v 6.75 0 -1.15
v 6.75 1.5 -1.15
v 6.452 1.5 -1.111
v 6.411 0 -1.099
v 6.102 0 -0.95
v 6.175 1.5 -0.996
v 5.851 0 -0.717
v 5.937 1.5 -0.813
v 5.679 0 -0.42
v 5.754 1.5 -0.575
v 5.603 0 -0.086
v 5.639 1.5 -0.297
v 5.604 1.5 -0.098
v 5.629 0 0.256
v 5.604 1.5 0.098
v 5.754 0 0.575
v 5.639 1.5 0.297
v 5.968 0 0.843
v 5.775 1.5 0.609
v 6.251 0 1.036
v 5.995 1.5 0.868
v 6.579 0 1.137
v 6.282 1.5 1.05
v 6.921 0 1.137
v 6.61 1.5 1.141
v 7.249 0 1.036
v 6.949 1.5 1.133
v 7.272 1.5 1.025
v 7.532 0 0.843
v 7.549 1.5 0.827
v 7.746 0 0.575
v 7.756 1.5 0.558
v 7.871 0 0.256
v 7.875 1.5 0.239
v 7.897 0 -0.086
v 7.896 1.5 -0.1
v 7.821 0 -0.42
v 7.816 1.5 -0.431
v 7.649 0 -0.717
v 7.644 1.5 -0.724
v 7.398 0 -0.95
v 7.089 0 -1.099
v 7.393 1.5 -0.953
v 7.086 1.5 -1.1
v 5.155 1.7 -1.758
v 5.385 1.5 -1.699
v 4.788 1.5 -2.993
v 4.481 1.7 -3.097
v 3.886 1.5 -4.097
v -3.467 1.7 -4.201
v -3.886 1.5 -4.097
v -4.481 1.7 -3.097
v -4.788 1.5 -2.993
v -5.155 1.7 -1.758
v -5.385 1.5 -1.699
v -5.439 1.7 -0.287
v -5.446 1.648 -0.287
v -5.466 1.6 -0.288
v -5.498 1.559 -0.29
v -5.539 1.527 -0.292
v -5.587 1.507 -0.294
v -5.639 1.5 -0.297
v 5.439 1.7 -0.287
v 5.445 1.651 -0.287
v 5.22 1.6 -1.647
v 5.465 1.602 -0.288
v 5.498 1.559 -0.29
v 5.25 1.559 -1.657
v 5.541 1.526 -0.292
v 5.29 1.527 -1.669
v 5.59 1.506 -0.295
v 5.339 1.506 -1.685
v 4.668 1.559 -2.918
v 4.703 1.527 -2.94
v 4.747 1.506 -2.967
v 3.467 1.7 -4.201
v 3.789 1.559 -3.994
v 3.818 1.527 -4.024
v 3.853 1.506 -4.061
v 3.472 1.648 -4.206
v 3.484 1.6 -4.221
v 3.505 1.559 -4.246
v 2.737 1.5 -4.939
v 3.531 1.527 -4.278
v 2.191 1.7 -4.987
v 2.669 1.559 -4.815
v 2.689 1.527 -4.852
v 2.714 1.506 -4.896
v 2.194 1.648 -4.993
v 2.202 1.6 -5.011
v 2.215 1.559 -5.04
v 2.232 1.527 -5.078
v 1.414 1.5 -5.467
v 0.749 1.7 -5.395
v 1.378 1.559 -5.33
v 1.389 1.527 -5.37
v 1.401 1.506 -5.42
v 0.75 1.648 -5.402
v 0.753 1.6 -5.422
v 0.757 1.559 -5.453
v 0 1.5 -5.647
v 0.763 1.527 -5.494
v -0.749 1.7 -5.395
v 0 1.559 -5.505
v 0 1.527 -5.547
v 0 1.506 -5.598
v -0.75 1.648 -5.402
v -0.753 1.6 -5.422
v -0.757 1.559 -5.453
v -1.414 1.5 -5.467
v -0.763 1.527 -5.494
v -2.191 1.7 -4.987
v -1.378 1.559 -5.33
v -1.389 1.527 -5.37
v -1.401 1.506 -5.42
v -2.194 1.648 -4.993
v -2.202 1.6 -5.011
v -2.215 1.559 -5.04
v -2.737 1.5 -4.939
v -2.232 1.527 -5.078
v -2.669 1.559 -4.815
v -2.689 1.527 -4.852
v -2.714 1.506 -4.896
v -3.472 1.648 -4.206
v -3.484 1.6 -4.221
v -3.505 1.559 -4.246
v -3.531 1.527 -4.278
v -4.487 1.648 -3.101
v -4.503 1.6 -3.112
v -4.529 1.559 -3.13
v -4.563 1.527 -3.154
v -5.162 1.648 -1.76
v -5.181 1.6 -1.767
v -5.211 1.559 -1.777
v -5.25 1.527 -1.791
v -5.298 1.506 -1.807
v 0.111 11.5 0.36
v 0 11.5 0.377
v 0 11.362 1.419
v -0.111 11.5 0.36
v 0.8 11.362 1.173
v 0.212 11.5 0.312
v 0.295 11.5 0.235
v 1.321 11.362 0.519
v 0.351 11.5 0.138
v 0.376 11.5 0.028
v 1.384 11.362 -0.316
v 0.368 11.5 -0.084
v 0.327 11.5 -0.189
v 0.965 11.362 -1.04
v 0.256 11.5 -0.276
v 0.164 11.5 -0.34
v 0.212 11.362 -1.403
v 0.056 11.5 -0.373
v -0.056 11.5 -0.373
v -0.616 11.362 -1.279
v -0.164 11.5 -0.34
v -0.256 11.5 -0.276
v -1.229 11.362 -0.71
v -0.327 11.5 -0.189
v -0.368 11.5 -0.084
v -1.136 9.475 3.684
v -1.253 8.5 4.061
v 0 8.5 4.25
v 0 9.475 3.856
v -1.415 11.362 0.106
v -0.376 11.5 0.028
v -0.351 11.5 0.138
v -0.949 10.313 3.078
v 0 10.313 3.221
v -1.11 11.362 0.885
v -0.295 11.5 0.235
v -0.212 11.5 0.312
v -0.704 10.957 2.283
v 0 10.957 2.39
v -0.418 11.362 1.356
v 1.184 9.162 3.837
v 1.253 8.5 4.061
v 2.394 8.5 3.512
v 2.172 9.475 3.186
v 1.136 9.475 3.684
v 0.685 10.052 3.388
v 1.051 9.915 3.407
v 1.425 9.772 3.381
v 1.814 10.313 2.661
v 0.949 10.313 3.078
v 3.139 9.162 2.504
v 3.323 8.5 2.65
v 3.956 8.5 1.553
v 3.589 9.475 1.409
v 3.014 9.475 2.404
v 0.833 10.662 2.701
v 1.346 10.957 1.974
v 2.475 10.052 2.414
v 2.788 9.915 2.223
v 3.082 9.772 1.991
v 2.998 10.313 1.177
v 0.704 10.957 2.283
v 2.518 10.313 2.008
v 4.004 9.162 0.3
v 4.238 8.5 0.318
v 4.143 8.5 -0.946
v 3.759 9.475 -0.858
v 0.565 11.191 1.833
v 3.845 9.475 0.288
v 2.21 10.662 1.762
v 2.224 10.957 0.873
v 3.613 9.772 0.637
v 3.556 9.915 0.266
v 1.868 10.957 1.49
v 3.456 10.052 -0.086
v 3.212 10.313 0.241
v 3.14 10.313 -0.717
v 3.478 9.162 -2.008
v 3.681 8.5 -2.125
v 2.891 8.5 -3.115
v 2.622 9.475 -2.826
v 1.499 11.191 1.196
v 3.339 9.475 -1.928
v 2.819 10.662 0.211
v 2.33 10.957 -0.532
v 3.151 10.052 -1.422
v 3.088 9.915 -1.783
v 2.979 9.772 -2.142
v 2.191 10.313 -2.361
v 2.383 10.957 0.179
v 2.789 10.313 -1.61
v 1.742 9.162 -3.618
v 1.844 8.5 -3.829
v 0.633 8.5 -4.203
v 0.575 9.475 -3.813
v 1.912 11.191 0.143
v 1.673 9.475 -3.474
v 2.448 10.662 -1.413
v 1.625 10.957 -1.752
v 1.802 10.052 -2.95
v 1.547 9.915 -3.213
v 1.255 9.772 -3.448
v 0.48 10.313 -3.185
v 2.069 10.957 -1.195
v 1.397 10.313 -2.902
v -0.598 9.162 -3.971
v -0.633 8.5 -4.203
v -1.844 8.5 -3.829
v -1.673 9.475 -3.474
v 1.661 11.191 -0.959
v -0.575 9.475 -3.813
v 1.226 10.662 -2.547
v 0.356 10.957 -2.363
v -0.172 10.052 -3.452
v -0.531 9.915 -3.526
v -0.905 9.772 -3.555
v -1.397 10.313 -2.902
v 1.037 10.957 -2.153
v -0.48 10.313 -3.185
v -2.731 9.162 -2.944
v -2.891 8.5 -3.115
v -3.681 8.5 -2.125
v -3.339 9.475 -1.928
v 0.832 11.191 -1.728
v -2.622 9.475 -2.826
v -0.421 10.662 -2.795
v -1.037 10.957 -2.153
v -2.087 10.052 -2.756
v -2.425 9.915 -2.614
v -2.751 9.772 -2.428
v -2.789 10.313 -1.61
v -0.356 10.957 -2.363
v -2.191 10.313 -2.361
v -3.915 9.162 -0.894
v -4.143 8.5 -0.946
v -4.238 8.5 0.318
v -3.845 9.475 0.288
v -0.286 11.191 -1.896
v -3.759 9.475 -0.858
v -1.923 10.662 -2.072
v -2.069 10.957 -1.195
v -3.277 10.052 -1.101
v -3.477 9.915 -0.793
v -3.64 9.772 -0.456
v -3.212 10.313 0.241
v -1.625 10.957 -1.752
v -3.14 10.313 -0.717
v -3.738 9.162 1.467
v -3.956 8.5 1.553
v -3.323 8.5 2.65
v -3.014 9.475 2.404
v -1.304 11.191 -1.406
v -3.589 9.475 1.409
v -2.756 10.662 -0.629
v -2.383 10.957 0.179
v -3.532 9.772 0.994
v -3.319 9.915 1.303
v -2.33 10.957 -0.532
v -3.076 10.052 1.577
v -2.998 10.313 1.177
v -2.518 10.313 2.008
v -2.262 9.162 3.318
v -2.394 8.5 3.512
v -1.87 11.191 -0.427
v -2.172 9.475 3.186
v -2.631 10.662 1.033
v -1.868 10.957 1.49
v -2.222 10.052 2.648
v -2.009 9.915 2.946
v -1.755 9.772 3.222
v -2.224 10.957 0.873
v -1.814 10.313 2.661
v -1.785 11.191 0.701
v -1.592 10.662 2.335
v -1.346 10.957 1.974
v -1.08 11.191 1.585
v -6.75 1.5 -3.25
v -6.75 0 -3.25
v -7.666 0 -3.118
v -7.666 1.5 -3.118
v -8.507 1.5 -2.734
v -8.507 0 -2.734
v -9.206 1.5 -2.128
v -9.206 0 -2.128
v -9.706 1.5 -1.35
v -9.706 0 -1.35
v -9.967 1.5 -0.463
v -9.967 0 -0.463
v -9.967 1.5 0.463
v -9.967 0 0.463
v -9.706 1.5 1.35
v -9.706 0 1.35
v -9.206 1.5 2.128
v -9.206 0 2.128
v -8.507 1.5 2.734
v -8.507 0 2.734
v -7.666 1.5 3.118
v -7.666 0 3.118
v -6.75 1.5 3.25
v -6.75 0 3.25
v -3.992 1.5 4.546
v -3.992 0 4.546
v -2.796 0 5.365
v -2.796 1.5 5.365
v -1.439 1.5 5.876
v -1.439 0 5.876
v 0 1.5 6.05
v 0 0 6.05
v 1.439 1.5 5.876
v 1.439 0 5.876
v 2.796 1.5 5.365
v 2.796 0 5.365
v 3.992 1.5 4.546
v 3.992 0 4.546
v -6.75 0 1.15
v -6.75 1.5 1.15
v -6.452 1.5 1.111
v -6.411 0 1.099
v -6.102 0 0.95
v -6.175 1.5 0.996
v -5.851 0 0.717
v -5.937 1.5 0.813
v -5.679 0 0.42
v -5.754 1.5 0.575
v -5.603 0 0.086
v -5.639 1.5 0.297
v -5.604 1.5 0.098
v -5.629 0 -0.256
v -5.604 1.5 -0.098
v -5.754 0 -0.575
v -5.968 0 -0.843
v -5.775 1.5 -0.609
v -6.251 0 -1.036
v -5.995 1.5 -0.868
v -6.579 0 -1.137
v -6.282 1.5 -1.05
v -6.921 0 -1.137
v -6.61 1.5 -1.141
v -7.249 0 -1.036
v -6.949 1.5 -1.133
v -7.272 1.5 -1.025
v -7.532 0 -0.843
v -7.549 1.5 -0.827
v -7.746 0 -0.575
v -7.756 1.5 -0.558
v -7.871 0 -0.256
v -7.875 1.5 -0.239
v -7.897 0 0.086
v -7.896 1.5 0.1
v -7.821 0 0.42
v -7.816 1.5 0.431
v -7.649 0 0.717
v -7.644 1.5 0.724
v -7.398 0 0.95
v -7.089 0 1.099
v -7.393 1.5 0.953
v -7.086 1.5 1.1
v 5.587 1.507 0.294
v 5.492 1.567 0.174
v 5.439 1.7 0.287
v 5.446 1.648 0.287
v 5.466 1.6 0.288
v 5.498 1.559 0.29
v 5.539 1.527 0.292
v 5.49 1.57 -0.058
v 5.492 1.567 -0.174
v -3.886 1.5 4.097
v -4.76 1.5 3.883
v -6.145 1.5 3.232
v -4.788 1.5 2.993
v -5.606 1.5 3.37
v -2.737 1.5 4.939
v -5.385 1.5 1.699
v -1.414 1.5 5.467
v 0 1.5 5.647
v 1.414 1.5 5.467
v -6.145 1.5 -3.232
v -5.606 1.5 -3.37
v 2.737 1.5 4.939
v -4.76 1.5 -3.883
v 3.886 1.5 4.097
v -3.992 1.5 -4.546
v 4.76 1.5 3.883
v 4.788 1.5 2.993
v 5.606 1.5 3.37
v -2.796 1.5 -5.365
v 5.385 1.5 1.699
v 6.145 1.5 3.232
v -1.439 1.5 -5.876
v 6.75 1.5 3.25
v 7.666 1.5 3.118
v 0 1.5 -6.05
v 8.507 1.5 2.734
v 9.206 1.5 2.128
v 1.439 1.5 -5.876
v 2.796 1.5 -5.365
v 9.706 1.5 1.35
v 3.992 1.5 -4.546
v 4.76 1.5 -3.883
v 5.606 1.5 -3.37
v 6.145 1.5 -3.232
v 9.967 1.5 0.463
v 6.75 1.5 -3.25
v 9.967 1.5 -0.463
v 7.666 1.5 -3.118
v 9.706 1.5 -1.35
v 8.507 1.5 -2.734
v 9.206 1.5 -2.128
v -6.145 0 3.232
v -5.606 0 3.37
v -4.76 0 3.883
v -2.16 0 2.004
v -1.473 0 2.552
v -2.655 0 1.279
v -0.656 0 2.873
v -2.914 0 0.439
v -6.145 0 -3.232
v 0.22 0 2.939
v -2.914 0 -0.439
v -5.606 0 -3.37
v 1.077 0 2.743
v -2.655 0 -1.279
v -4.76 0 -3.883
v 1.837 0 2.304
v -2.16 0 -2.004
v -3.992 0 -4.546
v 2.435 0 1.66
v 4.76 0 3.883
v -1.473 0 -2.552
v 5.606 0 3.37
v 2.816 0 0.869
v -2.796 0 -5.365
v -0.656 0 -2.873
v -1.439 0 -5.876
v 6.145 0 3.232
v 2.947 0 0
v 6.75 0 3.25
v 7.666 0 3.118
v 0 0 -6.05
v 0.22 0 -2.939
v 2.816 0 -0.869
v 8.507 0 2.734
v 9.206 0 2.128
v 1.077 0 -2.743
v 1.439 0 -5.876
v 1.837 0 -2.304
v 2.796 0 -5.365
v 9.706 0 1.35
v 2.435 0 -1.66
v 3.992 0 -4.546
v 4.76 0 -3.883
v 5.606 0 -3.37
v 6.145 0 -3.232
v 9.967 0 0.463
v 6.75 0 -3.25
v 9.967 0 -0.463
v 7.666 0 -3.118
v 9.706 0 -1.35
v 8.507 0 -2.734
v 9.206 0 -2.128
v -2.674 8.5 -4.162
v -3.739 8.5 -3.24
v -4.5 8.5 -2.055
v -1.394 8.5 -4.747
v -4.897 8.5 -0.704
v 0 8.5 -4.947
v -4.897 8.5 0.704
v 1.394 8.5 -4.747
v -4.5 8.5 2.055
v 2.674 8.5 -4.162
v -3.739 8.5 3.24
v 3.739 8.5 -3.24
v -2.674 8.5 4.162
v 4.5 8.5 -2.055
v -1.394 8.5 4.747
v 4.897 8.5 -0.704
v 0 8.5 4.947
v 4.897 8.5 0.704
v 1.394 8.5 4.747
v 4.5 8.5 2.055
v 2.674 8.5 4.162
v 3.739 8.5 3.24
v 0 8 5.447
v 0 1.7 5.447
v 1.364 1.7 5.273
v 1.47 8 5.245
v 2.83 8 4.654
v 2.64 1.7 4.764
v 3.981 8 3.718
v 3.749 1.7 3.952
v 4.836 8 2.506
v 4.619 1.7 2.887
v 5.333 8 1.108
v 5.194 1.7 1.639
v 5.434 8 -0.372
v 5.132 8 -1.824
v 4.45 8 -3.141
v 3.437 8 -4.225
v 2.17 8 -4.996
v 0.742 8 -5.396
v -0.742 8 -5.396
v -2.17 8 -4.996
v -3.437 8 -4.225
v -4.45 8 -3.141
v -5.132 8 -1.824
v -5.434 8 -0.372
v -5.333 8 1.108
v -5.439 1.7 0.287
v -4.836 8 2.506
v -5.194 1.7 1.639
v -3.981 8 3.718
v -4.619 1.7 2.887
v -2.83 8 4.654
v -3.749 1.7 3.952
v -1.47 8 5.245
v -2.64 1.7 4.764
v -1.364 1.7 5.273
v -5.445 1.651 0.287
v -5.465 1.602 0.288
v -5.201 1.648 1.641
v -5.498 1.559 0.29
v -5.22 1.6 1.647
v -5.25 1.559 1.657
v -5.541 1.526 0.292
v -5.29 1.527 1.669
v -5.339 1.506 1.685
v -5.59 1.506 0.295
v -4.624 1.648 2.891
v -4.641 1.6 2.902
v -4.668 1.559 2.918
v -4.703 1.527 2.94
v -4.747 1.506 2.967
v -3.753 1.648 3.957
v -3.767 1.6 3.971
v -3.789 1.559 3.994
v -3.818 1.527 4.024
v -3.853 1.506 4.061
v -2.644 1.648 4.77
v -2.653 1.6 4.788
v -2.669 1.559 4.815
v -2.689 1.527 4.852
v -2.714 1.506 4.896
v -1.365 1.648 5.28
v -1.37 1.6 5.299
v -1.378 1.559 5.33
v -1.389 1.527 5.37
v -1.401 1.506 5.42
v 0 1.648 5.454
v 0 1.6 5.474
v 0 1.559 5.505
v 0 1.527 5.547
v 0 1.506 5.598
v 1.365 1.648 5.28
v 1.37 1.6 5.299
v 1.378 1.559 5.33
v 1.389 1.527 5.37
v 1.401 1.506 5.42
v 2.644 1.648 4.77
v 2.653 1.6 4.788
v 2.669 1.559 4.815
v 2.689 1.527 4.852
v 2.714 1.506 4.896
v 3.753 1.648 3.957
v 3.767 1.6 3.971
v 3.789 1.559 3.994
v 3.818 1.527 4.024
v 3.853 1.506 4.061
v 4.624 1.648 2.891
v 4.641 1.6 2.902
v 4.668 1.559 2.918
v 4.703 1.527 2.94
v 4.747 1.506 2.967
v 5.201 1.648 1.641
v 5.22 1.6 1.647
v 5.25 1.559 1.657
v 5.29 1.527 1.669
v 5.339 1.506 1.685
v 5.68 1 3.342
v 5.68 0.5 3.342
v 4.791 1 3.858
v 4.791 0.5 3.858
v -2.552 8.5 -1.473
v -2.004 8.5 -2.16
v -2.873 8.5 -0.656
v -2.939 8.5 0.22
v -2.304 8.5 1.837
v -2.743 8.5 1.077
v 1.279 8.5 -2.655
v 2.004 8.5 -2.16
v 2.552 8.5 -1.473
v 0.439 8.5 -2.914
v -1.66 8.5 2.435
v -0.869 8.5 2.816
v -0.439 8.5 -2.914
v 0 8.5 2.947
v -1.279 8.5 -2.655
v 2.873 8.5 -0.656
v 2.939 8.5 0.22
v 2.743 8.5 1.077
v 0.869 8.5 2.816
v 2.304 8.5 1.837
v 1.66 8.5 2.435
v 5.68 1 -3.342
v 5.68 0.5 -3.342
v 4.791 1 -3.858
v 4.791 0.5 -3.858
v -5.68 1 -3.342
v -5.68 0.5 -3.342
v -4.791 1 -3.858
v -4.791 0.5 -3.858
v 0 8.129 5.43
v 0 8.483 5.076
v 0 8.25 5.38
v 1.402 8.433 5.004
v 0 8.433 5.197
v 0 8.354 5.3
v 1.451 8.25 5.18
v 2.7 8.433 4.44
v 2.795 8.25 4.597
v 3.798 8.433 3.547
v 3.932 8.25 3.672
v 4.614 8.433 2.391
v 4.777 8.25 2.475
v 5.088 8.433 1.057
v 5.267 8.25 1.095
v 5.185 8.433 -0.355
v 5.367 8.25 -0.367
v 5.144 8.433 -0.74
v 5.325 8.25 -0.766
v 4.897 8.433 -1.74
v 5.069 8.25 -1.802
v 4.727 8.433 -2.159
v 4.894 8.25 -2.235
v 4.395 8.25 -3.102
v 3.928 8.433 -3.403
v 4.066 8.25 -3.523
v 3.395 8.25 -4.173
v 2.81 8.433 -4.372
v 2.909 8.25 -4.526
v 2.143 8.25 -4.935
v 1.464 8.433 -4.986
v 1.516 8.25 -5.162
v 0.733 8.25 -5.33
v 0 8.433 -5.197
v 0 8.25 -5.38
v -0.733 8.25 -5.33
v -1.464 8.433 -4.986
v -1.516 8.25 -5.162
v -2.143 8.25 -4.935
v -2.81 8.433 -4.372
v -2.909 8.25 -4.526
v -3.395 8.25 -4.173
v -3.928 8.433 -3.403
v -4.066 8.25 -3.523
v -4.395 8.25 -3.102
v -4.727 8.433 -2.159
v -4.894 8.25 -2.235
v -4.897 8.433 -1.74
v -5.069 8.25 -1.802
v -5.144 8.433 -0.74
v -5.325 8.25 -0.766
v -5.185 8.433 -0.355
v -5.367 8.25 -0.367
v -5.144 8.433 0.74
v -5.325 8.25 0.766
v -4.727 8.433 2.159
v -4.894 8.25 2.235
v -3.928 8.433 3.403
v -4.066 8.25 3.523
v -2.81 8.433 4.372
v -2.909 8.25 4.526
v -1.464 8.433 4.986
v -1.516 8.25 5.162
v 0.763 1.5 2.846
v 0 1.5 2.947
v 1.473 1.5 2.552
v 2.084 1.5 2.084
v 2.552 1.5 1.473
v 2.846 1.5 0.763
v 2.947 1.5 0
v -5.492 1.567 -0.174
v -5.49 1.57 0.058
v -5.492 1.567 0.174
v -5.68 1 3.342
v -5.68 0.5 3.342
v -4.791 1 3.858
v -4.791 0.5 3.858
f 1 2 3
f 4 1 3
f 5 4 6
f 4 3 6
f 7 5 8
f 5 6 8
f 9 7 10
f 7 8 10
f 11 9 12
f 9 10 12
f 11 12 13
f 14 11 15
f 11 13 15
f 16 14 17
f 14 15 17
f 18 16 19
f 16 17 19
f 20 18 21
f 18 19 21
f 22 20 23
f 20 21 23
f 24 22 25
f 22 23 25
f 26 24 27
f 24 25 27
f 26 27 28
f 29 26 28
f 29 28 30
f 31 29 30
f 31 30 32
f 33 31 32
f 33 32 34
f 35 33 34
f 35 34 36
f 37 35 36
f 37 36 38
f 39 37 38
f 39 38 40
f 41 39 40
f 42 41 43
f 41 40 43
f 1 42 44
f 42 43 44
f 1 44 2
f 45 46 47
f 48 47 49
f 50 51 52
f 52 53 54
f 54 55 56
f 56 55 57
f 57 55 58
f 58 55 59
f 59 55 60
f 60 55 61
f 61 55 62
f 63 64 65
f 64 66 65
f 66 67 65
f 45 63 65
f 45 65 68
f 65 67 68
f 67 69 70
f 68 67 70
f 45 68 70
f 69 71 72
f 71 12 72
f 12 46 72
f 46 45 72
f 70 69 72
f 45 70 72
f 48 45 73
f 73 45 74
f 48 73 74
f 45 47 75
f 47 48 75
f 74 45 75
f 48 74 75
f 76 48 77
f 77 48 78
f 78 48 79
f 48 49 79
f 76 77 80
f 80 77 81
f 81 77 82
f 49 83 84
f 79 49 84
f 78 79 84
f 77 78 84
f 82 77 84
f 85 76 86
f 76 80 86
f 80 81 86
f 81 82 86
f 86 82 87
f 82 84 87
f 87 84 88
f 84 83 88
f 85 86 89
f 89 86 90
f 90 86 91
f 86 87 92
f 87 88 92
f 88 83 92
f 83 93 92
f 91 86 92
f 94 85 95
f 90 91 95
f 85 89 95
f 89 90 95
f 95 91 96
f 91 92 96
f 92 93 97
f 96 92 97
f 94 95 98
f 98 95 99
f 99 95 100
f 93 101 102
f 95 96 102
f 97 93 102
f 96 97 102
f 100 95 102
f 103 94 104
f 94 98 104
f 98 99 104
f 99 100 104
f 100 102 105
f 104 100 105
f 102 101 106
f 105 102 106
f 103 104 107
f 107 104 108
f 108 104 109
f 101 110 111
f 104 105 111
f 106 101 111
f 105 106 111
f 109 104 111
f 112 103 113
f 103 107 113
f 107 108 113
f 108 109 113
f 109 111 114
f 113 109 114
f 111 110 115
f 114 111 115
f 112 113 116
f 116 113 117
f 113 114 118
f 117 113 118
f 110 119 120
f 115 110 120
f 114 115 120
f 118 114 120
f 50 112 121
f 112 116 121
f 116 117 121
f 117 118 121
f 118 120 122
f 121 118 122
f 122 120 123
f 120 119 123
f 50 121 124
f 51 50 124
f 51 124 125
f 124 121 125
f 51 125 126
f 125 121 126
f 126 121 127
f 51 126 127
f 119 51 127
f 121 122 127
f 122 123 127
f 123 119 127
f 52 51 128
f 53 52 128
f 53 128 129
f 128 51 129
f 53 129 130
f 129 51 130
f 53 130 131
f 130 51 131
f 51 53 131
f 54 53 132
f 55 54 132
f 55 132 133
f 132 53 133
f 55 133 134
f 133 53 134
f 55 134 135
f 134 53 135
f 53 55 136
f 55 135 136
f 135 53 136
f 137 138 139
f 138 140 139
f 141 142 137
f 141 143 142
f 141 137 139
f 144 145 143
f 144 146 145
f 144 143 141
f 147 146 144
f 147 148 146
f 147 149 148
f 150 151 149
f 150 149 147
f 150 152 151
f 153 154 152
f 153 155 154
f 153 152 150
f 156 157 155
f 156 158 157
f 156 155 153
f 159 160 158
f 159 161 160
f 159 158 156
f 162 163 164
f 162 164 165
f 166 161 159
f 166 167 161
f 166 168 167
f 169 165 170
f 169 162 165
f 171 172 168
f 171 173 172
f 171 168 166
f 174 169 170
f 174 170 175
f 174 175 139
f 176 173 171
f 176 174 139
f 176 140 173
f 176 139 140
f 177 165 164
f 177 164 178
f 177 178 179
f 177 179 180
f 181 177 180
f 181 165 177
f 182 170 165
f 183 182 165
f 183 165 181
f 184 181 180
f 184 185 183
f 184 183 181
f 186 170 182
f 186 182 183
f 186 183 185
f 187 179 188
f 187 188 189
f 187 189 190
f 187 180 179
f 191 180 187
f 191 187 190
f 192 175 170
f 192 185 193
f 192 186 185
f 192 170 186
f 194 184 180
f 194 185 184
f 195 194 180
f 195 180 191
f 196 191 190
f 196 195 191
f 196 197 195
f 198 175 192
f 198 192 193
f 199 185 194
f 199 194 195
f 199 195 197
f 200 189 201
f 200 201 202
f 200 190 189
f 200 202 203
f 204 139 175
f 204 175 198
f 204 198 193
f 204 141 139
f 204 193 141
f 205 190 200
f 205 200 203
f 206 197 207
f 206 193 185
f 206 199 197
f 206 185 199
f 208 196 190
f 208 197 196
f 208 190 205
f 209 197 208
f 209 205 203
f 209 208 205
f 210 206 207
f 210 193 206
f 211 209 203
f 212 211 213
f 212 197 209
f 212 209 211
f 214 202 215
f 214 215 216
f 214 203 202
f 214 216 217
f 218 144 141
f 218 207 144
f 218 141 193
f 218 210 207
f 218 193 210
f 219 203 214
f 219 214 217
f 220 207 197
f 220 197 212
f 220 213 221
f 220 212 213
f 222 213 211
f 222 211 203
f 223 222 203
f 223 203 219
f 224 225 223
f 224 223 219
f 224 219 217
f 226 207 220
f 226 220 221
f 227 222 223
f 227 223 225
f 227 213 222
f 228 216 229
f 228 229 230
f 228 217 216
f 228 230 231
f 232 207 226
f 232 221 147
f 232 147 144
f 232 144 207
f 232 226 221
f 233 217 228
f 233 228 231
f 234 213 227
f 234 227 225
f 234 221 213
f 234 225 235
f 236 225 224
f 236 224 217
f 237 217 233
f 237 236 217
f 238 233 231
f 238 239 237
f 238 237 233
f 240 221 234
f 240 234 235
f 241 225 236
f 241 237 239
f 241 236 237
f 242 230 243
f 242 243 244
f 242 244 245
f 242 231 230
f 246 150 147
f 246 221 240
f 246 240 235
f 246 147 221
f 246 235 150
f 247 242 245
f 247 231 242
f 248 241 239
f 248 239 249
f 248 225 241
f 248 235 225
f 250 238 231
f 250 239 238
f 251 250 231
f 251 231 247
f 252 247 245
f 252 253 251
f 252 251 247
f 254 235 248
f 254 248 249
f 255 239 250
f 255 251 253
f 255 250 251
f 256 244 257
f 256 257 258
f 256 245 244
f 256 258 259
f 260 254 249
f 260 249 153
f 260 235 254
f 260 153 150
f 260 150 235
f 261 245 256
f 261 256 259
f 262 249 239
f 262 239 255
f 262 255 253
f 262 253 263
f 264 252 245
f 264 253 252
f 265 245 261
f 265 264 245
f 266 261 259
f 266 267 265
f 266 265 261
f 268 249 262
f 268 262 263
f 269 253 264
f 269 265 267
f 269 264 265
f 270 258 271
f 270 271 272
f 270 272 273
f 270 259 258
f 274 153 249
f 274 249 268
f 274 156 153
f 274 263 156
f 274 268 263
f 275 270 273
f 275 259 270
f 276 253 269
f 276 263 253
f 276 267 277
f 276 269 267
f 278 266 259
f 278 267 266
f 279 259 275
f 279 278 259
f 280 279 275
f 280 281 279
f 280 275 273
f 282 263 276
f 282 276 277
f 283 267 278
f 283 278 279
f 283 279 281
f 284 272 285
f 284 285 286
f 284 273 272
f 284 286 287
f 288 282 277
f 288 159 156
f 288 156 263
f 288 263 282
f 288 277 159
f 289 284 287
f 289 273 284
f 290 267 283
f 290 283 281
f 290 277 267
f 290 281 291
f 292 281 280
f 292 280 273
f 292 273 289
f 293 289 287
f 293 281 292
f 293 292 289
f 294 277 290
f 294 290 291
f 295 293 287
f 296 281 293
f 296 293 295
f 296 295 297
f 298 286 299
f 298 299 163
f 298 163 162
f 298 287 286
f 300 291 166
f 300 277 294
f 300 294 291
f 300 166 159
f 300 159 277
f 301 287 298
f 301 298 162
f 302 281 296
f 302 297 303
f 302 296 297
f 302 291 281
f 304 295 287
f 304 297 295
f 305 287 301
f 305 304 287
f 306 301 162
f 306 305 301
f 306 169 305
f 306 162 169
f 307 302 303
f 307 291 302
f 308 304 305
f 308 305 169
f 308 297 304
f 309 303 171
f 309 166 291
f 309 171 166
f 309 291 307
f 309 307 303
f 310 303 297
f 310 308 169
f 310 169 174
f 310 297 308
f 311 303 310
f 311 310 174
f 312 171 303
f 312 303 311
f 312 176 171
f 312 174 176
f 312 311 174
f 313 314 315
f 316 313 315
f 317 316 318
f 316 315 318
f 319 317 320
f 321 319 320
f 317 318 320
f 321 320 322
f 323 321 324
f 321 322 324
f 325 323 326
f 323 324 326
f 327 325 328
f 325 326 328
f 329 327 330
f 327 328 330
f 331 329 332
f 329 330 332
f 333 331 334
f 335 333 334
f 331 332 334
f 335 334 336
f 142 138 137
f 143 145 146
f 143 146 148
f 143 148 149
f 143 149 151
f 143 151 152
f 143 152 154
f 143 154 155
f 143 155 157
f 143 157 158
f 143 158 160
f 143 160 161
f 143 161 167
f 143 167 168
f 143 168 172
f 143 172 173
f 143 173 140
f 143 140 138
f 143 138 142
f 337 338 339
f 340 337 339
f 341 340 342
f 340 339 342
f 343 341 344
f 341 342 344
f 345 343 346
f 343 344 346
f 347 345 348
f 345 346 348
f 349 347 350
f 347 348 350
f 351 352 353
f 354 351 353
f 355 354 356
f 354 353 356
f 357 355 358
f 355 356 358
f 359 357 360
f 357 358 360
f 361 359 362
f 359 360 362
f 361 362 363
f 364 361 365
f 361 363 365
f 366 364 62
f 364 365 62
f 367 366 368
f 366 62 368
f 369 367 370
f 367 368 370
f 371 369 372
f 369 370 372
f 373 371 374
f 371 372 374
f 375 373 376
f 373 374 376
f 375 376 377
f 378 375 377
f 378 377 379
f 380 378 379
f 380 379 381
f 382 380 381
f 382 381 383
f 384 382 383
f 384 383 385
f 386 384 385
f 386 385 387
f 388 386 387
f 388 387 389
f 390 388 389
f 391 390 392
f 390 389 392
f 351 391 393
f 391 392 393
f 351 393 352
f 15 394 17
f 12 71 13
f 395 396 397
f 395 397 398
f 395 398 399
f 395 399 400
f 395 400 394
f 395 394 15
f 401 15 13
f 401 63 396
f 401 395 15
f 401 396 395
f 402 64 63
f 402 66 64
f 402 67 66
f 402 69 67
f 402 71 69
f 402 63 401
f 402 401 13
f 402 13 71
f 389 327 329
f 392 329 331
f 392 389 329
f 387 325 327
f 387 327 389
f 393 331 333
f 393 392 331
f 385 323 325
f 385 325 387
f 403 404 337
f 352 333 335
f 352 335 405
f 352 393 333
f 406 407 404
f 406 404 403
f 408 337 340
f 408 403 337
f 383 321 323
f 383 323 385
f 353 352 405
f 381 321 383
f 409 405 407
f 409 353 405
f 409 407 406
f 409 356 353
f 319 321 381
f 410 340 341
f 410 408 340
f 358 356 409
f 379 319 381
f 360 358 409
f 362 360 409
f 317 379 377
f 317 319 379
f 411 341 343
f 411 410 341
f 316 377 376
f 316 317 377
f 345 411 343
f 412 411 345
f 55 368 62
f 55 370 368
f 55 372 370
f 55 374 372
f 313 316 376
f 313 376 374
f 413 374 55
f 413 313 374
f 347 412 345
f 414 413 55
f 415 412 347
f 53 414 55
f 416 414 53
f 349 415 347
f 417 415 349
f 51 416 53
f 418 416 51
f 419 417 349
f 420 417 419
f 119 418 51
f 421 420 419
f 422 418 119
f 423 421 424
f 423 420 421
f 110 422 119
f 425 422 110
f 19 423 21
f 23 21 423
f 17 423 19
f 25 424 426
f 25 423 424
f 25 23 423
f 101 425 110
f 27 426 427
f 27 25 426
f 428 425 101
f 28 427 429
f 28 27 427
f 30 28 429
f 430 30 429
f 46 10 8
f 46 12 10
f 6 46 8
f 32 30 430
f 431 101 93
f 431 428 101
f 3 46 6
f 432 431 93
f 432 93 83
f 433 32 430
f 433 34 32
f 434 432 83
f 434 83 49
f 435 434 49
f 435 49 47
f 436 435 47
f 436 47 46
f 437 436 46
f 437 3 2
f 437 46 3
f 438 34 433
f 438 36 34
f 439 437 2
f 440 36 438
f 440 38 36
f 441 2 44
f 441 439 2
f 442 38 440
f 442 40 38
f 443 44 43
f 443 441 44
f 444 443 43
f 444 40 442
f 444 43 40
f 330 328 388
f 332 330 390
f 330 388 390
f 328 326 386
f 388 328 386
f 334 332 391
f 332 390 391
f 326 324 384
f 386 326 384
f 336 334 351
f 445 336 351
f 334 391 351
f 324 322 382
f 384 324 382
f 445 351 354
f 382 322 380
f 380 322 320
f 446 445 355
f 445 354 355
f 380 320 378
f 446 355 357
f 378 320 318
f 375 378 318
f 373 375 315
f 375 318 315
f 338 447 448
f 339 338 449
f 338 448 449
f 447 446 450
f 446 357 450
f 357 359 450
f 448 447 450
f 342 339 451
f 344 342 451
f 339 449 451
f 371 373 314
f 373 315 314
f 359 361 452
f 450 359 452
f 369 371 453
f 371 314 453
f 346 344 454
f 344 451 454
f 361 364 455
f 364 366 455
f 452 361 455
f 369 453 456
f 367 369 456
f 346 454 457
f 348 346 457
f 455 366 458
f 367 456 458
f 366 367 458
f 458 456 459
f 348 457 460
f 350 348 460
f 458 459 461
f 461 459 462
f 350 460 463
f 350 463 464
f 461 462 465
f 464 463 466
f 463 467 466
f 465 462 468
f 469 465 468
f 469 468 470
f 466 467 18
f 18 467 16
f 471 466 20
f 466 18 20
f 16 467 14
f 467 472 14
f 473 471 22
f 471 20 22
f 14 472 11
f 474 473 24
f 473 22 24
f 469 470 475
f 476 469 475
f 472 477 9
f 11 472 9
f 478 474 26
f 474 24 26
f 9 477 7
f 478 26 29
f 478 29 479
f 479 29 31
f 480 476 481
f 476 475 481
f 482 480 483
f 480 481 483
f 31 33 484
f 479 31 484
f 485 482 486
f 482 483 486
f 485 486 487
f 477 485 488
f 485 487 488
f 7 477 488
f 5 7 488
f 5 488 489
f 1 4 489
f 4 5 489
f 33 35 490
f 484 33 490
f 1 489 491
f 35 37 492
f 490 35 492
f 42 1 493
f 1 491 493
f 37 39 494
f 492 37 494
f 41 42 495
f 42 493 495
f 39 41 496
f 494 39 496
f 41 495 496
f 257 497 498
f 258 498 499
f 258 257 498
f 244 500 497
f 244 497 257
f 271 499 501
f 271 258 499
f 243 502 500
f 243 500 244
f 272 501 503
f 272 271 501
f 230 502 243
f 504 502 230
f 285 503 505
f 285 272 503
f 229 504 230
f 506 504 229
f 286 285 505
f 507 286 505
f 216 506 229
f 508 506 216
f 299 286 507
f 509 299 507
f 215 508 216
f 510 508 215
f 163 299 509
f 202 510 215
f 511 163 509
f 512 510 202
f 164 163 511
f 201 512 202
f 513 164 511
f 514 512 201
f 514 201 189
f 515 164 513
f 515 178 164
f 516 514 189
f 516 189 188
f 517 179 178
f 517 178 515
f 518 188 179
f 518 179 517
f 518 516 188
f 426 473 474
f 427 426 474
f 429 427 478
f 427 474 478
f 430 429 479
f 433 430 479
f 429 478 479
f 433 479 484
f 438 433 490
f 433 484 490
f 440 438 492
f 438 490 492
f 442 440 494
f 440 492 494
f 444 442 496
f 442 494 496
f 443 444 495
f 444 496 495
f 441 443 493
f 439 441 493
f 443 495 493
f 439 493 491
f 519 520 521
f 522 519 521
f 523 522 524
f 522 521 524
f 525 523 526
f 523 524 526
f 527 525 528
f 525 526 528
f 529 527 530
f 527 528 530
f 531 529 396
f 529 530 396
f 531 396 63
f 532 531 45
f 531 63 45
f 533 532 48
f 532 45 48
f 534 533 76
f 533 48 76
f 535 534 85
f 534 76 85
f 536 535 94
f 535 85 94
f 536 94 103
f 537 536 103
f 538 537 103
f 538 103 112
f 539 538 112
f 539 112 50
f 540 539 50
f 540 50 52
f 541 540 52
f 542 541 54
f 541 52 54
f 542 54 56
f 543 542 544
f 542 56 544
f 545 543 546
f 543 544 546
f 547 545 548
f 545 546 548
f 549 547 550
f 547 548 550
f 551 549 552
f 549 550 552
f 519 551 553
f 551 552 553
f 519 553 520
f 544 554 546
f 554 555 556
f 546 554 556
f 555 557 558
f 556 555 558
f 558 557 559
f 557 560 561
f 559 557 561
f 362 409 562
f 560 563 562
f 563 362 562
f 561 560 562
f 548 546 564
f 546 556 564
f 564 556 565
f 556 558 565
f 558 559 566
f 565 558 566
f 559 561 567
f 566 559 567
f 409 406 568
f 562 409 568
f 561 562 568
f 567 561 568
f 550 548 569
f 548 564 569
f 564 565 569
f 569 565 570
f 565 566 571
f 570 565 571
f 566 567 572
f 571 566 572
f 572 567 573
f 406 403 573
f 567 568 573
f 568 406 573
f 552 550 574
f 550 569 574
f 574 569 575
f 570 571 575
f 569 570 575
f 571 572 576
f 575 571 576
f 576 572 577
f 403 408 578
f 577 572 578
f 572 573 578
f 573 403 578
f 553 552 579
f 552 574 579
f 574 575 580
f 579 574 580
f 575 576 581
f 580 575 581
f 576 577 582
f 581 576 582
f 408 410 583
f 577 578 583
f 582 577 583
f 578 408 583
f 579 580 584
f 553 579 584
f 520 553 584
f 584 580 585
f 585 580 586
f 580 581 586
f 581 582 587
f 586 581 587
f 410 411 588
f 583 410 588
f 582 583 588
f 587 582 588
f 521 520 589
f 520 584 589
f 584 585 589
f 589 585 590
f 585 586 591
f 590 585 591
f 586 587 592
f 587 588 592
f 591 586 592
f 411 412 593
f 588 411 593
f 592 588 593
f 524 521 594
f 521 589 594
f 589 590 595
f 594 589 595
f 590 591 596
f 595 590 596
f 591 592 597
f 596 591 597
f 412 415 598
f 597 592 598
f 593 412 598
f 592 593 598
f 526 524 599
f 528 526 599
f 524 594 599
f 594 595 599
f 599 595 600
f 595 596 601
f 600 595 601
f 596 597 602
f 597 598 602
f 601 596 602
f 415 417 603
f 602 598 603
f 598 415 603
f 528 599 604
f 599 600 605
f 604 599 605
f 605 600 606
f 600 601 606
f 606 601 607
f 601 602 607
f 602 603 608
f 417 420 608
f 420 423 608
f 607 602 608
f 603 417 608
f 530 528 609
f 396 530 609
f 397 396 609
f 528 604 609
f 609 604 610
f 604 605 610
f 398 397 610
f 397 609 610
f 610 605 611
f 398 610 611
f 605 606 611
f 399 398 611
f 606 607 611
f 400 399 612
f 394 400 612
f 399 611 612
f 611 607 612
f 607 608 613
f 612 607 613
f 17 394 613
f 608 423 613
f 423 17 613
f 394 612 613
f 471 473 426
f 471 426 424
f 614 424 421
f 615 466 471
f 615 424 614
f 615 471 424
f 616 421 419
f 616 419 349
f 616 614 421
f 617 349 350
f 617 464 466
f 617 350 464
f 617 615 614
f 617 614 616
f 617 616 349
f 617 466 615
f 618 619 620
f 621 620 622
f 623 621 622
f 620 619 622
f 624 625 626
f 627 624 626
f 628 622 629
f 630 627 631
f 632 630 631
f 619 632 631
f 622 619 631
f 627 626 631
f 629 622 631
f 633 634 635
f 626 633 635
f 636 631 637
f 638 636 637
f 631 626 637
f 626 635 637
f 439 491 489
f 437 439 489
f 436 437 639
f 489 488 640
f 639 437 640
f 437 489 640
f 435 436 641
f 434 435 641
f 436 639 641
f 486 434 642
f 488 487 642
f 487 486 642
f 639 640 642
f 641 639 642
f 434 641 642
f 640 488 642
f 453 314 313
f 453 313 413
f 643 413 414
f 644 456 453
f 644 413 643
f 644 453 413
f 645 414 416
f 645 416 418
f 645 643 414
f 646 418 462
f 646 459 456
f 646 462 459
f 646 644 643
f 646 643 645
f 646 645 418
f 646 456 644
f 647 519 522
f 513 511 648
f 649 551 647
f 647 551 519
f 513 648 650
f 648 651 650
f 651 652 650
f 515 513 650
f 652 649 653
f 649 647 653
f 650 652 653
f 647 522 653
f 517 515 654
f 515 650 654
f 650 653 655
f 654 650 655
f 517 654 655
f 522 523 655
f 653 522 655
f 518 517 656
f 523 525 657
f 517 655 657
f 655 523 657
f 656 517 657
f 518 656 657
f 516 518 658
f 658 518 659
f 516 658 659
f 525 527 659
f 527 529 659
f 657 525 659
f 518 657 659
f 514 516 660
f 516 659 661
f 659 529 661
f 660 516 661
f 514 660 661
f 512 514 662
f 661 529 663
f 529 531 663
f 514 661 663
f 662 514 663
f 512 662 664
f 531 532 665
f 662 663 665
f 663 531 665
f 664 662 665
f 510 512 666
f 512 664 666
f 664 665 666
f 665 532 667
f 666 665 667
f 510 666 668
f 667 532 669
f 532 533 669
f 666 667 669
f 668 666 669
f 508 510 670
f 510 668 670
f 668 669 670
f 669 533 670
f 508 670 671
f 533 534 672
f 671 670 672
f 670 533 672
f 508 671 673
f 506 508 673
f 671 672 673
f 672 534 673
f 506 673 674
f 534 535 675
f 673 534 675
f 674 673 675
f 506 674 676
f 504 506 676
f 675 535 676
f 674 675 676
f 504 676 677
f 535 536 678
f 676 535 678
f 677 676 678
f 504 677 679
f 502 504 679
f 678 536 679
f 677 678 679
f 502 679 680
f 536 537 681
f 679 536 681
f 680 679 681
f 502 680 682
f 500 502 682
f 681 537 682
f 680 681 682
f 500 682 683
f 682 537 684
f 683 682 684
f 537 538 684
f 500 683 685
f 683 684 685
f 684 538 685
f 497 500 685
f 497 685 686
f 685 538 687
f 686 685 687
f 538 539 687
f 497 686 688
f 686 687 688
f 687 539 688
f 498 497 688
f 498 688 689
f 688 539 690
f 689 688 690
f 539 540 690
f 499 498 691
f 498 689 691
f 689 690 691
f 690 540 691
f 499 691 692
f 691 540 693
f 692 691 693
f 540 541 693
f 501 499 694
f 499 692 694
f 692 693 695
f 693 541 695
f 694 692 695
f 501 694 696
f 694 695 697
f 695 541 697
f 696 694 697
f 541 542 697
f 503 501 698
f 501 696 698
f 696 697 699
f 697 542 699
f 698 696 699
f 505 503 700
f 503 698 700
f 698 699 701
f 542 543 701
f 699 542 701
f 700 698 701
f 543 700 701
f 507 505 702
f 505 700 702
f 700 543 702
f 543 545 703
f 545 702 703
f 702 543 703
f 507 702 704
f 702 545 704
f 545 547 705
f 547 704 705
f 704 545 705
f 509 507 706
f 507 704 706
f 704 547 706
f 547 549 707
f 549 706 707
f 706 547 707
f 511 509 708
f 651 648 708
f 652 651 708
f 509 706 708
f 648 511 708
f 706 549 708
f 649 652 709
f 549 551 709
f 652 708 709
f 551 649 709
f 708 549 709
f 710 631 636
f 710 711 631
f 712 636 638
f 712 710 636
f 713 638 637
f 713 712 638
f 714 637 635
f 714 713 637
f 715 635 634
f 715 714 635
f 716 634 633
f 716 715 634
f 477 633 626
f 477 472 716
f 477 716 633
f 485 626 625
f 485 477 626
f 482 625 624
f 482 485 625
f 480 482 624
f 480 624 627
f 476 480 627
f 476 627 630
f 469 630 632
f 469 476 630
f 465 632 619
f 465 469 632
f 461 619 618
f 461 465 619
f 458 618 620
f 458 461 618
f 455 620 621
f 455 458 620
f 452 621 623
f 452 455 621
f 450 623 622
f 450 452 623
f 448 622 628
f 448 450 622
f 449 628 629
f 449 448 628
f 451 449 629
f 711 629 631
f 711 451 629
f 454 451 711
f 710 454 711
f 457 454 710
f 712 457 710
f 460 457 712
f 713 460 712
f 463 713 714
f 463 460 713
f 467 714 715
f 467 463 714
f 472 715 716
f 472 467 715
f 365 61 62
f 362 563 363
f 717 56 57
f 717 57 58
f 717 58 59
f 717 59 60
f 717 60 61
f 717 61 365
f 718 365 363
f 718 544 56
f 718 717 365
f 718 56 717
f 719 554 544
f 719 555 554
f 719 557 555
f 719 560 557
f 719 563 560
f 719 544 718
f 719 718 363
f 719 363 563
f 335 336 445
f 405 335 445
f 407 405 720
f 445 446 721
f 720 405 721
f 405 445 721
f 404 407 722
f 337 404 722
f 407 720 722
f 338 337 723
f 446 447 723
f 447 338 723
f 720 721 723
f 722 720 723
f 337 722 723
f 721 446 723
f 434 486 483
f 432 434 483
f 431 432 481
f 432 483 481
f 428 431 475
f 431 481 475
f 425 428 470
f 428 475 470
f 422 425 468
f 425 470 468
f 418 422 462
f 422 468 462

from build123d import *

# Parameters (mm, degrees)
BOSS_EXTRUDE1_OUTLINE_R = 2.946896199
BOSS_EXTRUDE1_DEPTH     = 1.5
SKETCH2_R               = 1.15
CUT_EXTRUDE1_DEPTH      = 12.783569218
SKETCH3_R               = 5.446896199
SKETCH3_R_2             = 2.946896199
BOSS_EXTRUDE2_DEPTH     = 7
SKETCH4_R               = 4.25
BOSS_EXTRUDE3_DEPTH     = 3
FILLET1_R               = 4
FILLET2_R               = 0.5
FILLET3_R               = 0.2


# Read off the part's stored shape, not the designer's step: Boss-Extrude1
with BuildPart() as part:
    # Boss-Extrude1 outline → Boss-Extrude1 (new body)
    with BuildSketch(Plane(origin=(0, 0, 0), x_dir=(1, 0, 0), z_dir=(0, 1, 0))):
        with BuildLine():
            ThreePointArc((-6.75, 3.25), (-10, 0), (-6.75, -3.25))
            add(Edge.make_bspline(
                [(-6.75, -3.25), (-5.557172284, -3.046535522), (-4.778196117, -3.855368441), (-3.992313535, -4.545759853)],
                knots=[0, 0, 0, 0, 1, 1, 1, 1], degree=3))
            ThreePointArc((-3.992313535, -4.545759853), (0, -6.05), (3.992313535, -4.545759853))
            add(Edge.make_bspline(
                [(6.75, -3.25), (5.557172284, -3.046535522), (4.778196117, -3.855368441), (3.992313535, -4.545759853)],
                knots=[0, 0, 0, 0, 1, 1, 1, 1], degree=3))
            ThreePointArc((6.75, -3.25), (10, 0), (6.75, 3.25))
            add(Edge.make_bspline(
                [(6.75, 3.25), (5.557172284, 3.046535522), (4.778196117, 3.855368441), (3.992313535, 4.545759853)],
                knots=[0, 0, 0, 0, 1, 1, 1, 1], degree=3))
            ThreePointArc((3.992313535, 4.545759853), (0, 6.05), (-3.992313535, 4.545759853))
            add(Edge.make_bspline(
                [(-6.75, 3.25), (-5.557172284, 3.046535522), (-4.778196117, 3.855368441), (-3.992313535, 4.545759853)],
                knots=[0, 0, 0, 0, 1, 1, 1, 1], degree=3))
        make_face()
        Circle(BOSS_EXTRUDE1_OUTLINE_R, mode=Mode.SUBTRACT)
    extrude(amount=BOSS_EXTRUDE1_DEPTH)

    # Sketch2 → Cut-Extrude1 (cut, through all)
    with BuildSketch(Plane(origin=(0, 1.5, 0), x_dir=(1, 0, 0), z_dir=(0, 1, 0))):
        with Locations(Location((-6.75, 0, 0), (0, 0, 270))):
            Circle(SKETCH2_R)
        with Locations(Location((6.75, 0, 0), (0, 0, 90))):
            Circle(SKETCH2_R)
    extrude(amount=-CUT_EXTRUDE1_DEPTH, mode=Mode.SUBTRACT)

    # Sketch3 → Boss-Extrude2 (add)
    with BuildSketch(Plane(origin=(0, 1.5, 0), x_dir=(1, 0, 0), z_dir=(0, 1, 0))):
        with Locations(Location((0, 0, 0), (0, 0, 270))):
            Circle(SKETCH3_R)
        with Locations(Location((0, 0, 0), (0, 0, 270))):
            Circle(SKETCH3_R_2, mode=Mode.SUBTRACT)
    extrude(amount=BOSS_EXTRUDE2_DEPTH)

    # Sketch4 → Boss-Extrude3 (add)
    with BuildSketch(Plane(origin=(0, 8.5, 0), x_dir=(1, 0, 0), z_dir=(0, 1, 0))):
        with Locations(Location((0, 0, 0), (0, 0, 270))):
            Circle(SKETCH4_R)
    extrude(amount=BOSS_EXTRUDE3_DEPTH)

    # Fillet1
    # the kernel refuses this fillet: 4 mm, written as the material it takes off along each edge
    with BuildSketch(Plane(origin=(0, 11.5, 0), x_dir=(0, 0, 1), z_dir=(-1, 0, 0))) as fillet1_piece_1:
        with BuildLine():
            CenterArc((0.377016654, -4), FILLET1_R, 14.477512186, 75.522487814)
            Line((0.377016654, 0), (0.377016654, 0.08))
            Line((0.377016654, 0.08), (4.25, 0.08))
            Line((4.25, 0.08), (4.33, 0))
            ThreePointArc((4.33, 0), (4.33, -1.5), (4.327459667, -2.98))
            Line((4.327459667, -2.98), (4.25, -3))
        make_face()
    revolve(axis=Axis((0, 11.5, 0), (0, 1, 0)), mode=Mode.SUBTRACT)

    # Fillet2
    fillet2_edges = [part.edges().sort_by_distance(p)[0] for p in [
        (0, 8.5, -5.446896199),
    ]]
    fillet(fillet2_edges, radius=FILLET2_R)

    # Fillet3
    fillet3_edges = [part.edges().sort_by_distance(p)[0] for p in [
        (0, 1.5, -5.446896199),
    ]]
    fillet(fillet3_edges, radius=FILLET3_R)


solid = part.part
